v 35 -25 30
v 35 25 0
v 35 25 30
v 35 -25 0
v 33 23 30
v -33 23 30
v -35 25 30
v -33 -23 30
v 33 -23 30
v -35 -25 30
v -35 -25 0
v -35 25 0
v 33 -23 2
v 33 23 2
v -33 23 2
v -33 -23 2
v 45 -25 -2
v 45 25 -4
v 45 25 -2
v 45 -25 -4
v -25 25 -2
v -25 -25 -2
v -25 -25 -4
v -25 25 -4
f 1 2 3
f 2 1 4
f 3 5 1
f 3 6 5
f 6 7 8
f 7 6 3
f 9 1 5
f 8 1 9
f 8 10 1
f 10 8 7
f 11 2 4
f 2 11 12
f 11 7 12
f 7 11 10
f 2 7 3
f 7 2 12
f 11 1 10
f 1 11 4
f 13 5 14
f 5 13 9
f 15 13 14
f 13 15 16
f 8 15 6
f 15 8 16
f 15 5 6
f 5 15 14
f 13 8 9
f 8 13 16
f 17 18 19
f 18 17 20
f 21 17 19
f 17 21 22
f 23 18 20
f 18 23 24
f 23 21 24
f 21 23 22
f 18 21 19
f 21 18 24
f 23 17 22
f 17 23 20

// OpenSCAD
// Two-part enclosure for small electronics board
// Print orientation: both parts on the bed, lid on +X side of box

// ---- Box ----
box_x = 70;      // outer length (X)
box_y = 50;      // outer width (Y)
box_z = 30;      // outer height (Z)
wall = 2;        // wall thickness
floor = 2;       // floor thickness

// ---- Lid ----
lip_w = 65.6;    // lip outer length (X)
lip_d = 45.6;    // lip outer width (Y)
lip_h = 4;       // lip height (Z)
lip_t = 1.5;     // lip wall thickness

// ---- Misc ----
eps = 0.5;       // cutter overshoot
gap = 10;        // gap between parts

$fn = 64;

// Derived
inner_x = box_x - 2 * wall;
inner_y = box_y - 2 * wall;
lip_d2  = lip_d + 2 * wall;   // lip outer width includes side walls

module box() {
    difference() {
        translate([-box_x / 2, -box_y / 2, 0])
            cube([box_x, box_y, box_z]);
        translate([-inner_x / 2, -inner_y / 2, floor])
            cube([inner_x, inner_y, box_z - floor + eps]); // open top
    }
}

module lid() {
    translate([0, 0, -lip_h])
        union() {
            // plate
            translate([-box_x / 2, -box_y / 2, 0])
                cube([box_x, box_y, 2]);
            // lip
            translate([-lip_w / 2, -lip_d2 / 2, 0])
                cube([lip_w, lip_d2, lip_t]);
        }
}

box();
translate([gap, 0, 0]) lid();
